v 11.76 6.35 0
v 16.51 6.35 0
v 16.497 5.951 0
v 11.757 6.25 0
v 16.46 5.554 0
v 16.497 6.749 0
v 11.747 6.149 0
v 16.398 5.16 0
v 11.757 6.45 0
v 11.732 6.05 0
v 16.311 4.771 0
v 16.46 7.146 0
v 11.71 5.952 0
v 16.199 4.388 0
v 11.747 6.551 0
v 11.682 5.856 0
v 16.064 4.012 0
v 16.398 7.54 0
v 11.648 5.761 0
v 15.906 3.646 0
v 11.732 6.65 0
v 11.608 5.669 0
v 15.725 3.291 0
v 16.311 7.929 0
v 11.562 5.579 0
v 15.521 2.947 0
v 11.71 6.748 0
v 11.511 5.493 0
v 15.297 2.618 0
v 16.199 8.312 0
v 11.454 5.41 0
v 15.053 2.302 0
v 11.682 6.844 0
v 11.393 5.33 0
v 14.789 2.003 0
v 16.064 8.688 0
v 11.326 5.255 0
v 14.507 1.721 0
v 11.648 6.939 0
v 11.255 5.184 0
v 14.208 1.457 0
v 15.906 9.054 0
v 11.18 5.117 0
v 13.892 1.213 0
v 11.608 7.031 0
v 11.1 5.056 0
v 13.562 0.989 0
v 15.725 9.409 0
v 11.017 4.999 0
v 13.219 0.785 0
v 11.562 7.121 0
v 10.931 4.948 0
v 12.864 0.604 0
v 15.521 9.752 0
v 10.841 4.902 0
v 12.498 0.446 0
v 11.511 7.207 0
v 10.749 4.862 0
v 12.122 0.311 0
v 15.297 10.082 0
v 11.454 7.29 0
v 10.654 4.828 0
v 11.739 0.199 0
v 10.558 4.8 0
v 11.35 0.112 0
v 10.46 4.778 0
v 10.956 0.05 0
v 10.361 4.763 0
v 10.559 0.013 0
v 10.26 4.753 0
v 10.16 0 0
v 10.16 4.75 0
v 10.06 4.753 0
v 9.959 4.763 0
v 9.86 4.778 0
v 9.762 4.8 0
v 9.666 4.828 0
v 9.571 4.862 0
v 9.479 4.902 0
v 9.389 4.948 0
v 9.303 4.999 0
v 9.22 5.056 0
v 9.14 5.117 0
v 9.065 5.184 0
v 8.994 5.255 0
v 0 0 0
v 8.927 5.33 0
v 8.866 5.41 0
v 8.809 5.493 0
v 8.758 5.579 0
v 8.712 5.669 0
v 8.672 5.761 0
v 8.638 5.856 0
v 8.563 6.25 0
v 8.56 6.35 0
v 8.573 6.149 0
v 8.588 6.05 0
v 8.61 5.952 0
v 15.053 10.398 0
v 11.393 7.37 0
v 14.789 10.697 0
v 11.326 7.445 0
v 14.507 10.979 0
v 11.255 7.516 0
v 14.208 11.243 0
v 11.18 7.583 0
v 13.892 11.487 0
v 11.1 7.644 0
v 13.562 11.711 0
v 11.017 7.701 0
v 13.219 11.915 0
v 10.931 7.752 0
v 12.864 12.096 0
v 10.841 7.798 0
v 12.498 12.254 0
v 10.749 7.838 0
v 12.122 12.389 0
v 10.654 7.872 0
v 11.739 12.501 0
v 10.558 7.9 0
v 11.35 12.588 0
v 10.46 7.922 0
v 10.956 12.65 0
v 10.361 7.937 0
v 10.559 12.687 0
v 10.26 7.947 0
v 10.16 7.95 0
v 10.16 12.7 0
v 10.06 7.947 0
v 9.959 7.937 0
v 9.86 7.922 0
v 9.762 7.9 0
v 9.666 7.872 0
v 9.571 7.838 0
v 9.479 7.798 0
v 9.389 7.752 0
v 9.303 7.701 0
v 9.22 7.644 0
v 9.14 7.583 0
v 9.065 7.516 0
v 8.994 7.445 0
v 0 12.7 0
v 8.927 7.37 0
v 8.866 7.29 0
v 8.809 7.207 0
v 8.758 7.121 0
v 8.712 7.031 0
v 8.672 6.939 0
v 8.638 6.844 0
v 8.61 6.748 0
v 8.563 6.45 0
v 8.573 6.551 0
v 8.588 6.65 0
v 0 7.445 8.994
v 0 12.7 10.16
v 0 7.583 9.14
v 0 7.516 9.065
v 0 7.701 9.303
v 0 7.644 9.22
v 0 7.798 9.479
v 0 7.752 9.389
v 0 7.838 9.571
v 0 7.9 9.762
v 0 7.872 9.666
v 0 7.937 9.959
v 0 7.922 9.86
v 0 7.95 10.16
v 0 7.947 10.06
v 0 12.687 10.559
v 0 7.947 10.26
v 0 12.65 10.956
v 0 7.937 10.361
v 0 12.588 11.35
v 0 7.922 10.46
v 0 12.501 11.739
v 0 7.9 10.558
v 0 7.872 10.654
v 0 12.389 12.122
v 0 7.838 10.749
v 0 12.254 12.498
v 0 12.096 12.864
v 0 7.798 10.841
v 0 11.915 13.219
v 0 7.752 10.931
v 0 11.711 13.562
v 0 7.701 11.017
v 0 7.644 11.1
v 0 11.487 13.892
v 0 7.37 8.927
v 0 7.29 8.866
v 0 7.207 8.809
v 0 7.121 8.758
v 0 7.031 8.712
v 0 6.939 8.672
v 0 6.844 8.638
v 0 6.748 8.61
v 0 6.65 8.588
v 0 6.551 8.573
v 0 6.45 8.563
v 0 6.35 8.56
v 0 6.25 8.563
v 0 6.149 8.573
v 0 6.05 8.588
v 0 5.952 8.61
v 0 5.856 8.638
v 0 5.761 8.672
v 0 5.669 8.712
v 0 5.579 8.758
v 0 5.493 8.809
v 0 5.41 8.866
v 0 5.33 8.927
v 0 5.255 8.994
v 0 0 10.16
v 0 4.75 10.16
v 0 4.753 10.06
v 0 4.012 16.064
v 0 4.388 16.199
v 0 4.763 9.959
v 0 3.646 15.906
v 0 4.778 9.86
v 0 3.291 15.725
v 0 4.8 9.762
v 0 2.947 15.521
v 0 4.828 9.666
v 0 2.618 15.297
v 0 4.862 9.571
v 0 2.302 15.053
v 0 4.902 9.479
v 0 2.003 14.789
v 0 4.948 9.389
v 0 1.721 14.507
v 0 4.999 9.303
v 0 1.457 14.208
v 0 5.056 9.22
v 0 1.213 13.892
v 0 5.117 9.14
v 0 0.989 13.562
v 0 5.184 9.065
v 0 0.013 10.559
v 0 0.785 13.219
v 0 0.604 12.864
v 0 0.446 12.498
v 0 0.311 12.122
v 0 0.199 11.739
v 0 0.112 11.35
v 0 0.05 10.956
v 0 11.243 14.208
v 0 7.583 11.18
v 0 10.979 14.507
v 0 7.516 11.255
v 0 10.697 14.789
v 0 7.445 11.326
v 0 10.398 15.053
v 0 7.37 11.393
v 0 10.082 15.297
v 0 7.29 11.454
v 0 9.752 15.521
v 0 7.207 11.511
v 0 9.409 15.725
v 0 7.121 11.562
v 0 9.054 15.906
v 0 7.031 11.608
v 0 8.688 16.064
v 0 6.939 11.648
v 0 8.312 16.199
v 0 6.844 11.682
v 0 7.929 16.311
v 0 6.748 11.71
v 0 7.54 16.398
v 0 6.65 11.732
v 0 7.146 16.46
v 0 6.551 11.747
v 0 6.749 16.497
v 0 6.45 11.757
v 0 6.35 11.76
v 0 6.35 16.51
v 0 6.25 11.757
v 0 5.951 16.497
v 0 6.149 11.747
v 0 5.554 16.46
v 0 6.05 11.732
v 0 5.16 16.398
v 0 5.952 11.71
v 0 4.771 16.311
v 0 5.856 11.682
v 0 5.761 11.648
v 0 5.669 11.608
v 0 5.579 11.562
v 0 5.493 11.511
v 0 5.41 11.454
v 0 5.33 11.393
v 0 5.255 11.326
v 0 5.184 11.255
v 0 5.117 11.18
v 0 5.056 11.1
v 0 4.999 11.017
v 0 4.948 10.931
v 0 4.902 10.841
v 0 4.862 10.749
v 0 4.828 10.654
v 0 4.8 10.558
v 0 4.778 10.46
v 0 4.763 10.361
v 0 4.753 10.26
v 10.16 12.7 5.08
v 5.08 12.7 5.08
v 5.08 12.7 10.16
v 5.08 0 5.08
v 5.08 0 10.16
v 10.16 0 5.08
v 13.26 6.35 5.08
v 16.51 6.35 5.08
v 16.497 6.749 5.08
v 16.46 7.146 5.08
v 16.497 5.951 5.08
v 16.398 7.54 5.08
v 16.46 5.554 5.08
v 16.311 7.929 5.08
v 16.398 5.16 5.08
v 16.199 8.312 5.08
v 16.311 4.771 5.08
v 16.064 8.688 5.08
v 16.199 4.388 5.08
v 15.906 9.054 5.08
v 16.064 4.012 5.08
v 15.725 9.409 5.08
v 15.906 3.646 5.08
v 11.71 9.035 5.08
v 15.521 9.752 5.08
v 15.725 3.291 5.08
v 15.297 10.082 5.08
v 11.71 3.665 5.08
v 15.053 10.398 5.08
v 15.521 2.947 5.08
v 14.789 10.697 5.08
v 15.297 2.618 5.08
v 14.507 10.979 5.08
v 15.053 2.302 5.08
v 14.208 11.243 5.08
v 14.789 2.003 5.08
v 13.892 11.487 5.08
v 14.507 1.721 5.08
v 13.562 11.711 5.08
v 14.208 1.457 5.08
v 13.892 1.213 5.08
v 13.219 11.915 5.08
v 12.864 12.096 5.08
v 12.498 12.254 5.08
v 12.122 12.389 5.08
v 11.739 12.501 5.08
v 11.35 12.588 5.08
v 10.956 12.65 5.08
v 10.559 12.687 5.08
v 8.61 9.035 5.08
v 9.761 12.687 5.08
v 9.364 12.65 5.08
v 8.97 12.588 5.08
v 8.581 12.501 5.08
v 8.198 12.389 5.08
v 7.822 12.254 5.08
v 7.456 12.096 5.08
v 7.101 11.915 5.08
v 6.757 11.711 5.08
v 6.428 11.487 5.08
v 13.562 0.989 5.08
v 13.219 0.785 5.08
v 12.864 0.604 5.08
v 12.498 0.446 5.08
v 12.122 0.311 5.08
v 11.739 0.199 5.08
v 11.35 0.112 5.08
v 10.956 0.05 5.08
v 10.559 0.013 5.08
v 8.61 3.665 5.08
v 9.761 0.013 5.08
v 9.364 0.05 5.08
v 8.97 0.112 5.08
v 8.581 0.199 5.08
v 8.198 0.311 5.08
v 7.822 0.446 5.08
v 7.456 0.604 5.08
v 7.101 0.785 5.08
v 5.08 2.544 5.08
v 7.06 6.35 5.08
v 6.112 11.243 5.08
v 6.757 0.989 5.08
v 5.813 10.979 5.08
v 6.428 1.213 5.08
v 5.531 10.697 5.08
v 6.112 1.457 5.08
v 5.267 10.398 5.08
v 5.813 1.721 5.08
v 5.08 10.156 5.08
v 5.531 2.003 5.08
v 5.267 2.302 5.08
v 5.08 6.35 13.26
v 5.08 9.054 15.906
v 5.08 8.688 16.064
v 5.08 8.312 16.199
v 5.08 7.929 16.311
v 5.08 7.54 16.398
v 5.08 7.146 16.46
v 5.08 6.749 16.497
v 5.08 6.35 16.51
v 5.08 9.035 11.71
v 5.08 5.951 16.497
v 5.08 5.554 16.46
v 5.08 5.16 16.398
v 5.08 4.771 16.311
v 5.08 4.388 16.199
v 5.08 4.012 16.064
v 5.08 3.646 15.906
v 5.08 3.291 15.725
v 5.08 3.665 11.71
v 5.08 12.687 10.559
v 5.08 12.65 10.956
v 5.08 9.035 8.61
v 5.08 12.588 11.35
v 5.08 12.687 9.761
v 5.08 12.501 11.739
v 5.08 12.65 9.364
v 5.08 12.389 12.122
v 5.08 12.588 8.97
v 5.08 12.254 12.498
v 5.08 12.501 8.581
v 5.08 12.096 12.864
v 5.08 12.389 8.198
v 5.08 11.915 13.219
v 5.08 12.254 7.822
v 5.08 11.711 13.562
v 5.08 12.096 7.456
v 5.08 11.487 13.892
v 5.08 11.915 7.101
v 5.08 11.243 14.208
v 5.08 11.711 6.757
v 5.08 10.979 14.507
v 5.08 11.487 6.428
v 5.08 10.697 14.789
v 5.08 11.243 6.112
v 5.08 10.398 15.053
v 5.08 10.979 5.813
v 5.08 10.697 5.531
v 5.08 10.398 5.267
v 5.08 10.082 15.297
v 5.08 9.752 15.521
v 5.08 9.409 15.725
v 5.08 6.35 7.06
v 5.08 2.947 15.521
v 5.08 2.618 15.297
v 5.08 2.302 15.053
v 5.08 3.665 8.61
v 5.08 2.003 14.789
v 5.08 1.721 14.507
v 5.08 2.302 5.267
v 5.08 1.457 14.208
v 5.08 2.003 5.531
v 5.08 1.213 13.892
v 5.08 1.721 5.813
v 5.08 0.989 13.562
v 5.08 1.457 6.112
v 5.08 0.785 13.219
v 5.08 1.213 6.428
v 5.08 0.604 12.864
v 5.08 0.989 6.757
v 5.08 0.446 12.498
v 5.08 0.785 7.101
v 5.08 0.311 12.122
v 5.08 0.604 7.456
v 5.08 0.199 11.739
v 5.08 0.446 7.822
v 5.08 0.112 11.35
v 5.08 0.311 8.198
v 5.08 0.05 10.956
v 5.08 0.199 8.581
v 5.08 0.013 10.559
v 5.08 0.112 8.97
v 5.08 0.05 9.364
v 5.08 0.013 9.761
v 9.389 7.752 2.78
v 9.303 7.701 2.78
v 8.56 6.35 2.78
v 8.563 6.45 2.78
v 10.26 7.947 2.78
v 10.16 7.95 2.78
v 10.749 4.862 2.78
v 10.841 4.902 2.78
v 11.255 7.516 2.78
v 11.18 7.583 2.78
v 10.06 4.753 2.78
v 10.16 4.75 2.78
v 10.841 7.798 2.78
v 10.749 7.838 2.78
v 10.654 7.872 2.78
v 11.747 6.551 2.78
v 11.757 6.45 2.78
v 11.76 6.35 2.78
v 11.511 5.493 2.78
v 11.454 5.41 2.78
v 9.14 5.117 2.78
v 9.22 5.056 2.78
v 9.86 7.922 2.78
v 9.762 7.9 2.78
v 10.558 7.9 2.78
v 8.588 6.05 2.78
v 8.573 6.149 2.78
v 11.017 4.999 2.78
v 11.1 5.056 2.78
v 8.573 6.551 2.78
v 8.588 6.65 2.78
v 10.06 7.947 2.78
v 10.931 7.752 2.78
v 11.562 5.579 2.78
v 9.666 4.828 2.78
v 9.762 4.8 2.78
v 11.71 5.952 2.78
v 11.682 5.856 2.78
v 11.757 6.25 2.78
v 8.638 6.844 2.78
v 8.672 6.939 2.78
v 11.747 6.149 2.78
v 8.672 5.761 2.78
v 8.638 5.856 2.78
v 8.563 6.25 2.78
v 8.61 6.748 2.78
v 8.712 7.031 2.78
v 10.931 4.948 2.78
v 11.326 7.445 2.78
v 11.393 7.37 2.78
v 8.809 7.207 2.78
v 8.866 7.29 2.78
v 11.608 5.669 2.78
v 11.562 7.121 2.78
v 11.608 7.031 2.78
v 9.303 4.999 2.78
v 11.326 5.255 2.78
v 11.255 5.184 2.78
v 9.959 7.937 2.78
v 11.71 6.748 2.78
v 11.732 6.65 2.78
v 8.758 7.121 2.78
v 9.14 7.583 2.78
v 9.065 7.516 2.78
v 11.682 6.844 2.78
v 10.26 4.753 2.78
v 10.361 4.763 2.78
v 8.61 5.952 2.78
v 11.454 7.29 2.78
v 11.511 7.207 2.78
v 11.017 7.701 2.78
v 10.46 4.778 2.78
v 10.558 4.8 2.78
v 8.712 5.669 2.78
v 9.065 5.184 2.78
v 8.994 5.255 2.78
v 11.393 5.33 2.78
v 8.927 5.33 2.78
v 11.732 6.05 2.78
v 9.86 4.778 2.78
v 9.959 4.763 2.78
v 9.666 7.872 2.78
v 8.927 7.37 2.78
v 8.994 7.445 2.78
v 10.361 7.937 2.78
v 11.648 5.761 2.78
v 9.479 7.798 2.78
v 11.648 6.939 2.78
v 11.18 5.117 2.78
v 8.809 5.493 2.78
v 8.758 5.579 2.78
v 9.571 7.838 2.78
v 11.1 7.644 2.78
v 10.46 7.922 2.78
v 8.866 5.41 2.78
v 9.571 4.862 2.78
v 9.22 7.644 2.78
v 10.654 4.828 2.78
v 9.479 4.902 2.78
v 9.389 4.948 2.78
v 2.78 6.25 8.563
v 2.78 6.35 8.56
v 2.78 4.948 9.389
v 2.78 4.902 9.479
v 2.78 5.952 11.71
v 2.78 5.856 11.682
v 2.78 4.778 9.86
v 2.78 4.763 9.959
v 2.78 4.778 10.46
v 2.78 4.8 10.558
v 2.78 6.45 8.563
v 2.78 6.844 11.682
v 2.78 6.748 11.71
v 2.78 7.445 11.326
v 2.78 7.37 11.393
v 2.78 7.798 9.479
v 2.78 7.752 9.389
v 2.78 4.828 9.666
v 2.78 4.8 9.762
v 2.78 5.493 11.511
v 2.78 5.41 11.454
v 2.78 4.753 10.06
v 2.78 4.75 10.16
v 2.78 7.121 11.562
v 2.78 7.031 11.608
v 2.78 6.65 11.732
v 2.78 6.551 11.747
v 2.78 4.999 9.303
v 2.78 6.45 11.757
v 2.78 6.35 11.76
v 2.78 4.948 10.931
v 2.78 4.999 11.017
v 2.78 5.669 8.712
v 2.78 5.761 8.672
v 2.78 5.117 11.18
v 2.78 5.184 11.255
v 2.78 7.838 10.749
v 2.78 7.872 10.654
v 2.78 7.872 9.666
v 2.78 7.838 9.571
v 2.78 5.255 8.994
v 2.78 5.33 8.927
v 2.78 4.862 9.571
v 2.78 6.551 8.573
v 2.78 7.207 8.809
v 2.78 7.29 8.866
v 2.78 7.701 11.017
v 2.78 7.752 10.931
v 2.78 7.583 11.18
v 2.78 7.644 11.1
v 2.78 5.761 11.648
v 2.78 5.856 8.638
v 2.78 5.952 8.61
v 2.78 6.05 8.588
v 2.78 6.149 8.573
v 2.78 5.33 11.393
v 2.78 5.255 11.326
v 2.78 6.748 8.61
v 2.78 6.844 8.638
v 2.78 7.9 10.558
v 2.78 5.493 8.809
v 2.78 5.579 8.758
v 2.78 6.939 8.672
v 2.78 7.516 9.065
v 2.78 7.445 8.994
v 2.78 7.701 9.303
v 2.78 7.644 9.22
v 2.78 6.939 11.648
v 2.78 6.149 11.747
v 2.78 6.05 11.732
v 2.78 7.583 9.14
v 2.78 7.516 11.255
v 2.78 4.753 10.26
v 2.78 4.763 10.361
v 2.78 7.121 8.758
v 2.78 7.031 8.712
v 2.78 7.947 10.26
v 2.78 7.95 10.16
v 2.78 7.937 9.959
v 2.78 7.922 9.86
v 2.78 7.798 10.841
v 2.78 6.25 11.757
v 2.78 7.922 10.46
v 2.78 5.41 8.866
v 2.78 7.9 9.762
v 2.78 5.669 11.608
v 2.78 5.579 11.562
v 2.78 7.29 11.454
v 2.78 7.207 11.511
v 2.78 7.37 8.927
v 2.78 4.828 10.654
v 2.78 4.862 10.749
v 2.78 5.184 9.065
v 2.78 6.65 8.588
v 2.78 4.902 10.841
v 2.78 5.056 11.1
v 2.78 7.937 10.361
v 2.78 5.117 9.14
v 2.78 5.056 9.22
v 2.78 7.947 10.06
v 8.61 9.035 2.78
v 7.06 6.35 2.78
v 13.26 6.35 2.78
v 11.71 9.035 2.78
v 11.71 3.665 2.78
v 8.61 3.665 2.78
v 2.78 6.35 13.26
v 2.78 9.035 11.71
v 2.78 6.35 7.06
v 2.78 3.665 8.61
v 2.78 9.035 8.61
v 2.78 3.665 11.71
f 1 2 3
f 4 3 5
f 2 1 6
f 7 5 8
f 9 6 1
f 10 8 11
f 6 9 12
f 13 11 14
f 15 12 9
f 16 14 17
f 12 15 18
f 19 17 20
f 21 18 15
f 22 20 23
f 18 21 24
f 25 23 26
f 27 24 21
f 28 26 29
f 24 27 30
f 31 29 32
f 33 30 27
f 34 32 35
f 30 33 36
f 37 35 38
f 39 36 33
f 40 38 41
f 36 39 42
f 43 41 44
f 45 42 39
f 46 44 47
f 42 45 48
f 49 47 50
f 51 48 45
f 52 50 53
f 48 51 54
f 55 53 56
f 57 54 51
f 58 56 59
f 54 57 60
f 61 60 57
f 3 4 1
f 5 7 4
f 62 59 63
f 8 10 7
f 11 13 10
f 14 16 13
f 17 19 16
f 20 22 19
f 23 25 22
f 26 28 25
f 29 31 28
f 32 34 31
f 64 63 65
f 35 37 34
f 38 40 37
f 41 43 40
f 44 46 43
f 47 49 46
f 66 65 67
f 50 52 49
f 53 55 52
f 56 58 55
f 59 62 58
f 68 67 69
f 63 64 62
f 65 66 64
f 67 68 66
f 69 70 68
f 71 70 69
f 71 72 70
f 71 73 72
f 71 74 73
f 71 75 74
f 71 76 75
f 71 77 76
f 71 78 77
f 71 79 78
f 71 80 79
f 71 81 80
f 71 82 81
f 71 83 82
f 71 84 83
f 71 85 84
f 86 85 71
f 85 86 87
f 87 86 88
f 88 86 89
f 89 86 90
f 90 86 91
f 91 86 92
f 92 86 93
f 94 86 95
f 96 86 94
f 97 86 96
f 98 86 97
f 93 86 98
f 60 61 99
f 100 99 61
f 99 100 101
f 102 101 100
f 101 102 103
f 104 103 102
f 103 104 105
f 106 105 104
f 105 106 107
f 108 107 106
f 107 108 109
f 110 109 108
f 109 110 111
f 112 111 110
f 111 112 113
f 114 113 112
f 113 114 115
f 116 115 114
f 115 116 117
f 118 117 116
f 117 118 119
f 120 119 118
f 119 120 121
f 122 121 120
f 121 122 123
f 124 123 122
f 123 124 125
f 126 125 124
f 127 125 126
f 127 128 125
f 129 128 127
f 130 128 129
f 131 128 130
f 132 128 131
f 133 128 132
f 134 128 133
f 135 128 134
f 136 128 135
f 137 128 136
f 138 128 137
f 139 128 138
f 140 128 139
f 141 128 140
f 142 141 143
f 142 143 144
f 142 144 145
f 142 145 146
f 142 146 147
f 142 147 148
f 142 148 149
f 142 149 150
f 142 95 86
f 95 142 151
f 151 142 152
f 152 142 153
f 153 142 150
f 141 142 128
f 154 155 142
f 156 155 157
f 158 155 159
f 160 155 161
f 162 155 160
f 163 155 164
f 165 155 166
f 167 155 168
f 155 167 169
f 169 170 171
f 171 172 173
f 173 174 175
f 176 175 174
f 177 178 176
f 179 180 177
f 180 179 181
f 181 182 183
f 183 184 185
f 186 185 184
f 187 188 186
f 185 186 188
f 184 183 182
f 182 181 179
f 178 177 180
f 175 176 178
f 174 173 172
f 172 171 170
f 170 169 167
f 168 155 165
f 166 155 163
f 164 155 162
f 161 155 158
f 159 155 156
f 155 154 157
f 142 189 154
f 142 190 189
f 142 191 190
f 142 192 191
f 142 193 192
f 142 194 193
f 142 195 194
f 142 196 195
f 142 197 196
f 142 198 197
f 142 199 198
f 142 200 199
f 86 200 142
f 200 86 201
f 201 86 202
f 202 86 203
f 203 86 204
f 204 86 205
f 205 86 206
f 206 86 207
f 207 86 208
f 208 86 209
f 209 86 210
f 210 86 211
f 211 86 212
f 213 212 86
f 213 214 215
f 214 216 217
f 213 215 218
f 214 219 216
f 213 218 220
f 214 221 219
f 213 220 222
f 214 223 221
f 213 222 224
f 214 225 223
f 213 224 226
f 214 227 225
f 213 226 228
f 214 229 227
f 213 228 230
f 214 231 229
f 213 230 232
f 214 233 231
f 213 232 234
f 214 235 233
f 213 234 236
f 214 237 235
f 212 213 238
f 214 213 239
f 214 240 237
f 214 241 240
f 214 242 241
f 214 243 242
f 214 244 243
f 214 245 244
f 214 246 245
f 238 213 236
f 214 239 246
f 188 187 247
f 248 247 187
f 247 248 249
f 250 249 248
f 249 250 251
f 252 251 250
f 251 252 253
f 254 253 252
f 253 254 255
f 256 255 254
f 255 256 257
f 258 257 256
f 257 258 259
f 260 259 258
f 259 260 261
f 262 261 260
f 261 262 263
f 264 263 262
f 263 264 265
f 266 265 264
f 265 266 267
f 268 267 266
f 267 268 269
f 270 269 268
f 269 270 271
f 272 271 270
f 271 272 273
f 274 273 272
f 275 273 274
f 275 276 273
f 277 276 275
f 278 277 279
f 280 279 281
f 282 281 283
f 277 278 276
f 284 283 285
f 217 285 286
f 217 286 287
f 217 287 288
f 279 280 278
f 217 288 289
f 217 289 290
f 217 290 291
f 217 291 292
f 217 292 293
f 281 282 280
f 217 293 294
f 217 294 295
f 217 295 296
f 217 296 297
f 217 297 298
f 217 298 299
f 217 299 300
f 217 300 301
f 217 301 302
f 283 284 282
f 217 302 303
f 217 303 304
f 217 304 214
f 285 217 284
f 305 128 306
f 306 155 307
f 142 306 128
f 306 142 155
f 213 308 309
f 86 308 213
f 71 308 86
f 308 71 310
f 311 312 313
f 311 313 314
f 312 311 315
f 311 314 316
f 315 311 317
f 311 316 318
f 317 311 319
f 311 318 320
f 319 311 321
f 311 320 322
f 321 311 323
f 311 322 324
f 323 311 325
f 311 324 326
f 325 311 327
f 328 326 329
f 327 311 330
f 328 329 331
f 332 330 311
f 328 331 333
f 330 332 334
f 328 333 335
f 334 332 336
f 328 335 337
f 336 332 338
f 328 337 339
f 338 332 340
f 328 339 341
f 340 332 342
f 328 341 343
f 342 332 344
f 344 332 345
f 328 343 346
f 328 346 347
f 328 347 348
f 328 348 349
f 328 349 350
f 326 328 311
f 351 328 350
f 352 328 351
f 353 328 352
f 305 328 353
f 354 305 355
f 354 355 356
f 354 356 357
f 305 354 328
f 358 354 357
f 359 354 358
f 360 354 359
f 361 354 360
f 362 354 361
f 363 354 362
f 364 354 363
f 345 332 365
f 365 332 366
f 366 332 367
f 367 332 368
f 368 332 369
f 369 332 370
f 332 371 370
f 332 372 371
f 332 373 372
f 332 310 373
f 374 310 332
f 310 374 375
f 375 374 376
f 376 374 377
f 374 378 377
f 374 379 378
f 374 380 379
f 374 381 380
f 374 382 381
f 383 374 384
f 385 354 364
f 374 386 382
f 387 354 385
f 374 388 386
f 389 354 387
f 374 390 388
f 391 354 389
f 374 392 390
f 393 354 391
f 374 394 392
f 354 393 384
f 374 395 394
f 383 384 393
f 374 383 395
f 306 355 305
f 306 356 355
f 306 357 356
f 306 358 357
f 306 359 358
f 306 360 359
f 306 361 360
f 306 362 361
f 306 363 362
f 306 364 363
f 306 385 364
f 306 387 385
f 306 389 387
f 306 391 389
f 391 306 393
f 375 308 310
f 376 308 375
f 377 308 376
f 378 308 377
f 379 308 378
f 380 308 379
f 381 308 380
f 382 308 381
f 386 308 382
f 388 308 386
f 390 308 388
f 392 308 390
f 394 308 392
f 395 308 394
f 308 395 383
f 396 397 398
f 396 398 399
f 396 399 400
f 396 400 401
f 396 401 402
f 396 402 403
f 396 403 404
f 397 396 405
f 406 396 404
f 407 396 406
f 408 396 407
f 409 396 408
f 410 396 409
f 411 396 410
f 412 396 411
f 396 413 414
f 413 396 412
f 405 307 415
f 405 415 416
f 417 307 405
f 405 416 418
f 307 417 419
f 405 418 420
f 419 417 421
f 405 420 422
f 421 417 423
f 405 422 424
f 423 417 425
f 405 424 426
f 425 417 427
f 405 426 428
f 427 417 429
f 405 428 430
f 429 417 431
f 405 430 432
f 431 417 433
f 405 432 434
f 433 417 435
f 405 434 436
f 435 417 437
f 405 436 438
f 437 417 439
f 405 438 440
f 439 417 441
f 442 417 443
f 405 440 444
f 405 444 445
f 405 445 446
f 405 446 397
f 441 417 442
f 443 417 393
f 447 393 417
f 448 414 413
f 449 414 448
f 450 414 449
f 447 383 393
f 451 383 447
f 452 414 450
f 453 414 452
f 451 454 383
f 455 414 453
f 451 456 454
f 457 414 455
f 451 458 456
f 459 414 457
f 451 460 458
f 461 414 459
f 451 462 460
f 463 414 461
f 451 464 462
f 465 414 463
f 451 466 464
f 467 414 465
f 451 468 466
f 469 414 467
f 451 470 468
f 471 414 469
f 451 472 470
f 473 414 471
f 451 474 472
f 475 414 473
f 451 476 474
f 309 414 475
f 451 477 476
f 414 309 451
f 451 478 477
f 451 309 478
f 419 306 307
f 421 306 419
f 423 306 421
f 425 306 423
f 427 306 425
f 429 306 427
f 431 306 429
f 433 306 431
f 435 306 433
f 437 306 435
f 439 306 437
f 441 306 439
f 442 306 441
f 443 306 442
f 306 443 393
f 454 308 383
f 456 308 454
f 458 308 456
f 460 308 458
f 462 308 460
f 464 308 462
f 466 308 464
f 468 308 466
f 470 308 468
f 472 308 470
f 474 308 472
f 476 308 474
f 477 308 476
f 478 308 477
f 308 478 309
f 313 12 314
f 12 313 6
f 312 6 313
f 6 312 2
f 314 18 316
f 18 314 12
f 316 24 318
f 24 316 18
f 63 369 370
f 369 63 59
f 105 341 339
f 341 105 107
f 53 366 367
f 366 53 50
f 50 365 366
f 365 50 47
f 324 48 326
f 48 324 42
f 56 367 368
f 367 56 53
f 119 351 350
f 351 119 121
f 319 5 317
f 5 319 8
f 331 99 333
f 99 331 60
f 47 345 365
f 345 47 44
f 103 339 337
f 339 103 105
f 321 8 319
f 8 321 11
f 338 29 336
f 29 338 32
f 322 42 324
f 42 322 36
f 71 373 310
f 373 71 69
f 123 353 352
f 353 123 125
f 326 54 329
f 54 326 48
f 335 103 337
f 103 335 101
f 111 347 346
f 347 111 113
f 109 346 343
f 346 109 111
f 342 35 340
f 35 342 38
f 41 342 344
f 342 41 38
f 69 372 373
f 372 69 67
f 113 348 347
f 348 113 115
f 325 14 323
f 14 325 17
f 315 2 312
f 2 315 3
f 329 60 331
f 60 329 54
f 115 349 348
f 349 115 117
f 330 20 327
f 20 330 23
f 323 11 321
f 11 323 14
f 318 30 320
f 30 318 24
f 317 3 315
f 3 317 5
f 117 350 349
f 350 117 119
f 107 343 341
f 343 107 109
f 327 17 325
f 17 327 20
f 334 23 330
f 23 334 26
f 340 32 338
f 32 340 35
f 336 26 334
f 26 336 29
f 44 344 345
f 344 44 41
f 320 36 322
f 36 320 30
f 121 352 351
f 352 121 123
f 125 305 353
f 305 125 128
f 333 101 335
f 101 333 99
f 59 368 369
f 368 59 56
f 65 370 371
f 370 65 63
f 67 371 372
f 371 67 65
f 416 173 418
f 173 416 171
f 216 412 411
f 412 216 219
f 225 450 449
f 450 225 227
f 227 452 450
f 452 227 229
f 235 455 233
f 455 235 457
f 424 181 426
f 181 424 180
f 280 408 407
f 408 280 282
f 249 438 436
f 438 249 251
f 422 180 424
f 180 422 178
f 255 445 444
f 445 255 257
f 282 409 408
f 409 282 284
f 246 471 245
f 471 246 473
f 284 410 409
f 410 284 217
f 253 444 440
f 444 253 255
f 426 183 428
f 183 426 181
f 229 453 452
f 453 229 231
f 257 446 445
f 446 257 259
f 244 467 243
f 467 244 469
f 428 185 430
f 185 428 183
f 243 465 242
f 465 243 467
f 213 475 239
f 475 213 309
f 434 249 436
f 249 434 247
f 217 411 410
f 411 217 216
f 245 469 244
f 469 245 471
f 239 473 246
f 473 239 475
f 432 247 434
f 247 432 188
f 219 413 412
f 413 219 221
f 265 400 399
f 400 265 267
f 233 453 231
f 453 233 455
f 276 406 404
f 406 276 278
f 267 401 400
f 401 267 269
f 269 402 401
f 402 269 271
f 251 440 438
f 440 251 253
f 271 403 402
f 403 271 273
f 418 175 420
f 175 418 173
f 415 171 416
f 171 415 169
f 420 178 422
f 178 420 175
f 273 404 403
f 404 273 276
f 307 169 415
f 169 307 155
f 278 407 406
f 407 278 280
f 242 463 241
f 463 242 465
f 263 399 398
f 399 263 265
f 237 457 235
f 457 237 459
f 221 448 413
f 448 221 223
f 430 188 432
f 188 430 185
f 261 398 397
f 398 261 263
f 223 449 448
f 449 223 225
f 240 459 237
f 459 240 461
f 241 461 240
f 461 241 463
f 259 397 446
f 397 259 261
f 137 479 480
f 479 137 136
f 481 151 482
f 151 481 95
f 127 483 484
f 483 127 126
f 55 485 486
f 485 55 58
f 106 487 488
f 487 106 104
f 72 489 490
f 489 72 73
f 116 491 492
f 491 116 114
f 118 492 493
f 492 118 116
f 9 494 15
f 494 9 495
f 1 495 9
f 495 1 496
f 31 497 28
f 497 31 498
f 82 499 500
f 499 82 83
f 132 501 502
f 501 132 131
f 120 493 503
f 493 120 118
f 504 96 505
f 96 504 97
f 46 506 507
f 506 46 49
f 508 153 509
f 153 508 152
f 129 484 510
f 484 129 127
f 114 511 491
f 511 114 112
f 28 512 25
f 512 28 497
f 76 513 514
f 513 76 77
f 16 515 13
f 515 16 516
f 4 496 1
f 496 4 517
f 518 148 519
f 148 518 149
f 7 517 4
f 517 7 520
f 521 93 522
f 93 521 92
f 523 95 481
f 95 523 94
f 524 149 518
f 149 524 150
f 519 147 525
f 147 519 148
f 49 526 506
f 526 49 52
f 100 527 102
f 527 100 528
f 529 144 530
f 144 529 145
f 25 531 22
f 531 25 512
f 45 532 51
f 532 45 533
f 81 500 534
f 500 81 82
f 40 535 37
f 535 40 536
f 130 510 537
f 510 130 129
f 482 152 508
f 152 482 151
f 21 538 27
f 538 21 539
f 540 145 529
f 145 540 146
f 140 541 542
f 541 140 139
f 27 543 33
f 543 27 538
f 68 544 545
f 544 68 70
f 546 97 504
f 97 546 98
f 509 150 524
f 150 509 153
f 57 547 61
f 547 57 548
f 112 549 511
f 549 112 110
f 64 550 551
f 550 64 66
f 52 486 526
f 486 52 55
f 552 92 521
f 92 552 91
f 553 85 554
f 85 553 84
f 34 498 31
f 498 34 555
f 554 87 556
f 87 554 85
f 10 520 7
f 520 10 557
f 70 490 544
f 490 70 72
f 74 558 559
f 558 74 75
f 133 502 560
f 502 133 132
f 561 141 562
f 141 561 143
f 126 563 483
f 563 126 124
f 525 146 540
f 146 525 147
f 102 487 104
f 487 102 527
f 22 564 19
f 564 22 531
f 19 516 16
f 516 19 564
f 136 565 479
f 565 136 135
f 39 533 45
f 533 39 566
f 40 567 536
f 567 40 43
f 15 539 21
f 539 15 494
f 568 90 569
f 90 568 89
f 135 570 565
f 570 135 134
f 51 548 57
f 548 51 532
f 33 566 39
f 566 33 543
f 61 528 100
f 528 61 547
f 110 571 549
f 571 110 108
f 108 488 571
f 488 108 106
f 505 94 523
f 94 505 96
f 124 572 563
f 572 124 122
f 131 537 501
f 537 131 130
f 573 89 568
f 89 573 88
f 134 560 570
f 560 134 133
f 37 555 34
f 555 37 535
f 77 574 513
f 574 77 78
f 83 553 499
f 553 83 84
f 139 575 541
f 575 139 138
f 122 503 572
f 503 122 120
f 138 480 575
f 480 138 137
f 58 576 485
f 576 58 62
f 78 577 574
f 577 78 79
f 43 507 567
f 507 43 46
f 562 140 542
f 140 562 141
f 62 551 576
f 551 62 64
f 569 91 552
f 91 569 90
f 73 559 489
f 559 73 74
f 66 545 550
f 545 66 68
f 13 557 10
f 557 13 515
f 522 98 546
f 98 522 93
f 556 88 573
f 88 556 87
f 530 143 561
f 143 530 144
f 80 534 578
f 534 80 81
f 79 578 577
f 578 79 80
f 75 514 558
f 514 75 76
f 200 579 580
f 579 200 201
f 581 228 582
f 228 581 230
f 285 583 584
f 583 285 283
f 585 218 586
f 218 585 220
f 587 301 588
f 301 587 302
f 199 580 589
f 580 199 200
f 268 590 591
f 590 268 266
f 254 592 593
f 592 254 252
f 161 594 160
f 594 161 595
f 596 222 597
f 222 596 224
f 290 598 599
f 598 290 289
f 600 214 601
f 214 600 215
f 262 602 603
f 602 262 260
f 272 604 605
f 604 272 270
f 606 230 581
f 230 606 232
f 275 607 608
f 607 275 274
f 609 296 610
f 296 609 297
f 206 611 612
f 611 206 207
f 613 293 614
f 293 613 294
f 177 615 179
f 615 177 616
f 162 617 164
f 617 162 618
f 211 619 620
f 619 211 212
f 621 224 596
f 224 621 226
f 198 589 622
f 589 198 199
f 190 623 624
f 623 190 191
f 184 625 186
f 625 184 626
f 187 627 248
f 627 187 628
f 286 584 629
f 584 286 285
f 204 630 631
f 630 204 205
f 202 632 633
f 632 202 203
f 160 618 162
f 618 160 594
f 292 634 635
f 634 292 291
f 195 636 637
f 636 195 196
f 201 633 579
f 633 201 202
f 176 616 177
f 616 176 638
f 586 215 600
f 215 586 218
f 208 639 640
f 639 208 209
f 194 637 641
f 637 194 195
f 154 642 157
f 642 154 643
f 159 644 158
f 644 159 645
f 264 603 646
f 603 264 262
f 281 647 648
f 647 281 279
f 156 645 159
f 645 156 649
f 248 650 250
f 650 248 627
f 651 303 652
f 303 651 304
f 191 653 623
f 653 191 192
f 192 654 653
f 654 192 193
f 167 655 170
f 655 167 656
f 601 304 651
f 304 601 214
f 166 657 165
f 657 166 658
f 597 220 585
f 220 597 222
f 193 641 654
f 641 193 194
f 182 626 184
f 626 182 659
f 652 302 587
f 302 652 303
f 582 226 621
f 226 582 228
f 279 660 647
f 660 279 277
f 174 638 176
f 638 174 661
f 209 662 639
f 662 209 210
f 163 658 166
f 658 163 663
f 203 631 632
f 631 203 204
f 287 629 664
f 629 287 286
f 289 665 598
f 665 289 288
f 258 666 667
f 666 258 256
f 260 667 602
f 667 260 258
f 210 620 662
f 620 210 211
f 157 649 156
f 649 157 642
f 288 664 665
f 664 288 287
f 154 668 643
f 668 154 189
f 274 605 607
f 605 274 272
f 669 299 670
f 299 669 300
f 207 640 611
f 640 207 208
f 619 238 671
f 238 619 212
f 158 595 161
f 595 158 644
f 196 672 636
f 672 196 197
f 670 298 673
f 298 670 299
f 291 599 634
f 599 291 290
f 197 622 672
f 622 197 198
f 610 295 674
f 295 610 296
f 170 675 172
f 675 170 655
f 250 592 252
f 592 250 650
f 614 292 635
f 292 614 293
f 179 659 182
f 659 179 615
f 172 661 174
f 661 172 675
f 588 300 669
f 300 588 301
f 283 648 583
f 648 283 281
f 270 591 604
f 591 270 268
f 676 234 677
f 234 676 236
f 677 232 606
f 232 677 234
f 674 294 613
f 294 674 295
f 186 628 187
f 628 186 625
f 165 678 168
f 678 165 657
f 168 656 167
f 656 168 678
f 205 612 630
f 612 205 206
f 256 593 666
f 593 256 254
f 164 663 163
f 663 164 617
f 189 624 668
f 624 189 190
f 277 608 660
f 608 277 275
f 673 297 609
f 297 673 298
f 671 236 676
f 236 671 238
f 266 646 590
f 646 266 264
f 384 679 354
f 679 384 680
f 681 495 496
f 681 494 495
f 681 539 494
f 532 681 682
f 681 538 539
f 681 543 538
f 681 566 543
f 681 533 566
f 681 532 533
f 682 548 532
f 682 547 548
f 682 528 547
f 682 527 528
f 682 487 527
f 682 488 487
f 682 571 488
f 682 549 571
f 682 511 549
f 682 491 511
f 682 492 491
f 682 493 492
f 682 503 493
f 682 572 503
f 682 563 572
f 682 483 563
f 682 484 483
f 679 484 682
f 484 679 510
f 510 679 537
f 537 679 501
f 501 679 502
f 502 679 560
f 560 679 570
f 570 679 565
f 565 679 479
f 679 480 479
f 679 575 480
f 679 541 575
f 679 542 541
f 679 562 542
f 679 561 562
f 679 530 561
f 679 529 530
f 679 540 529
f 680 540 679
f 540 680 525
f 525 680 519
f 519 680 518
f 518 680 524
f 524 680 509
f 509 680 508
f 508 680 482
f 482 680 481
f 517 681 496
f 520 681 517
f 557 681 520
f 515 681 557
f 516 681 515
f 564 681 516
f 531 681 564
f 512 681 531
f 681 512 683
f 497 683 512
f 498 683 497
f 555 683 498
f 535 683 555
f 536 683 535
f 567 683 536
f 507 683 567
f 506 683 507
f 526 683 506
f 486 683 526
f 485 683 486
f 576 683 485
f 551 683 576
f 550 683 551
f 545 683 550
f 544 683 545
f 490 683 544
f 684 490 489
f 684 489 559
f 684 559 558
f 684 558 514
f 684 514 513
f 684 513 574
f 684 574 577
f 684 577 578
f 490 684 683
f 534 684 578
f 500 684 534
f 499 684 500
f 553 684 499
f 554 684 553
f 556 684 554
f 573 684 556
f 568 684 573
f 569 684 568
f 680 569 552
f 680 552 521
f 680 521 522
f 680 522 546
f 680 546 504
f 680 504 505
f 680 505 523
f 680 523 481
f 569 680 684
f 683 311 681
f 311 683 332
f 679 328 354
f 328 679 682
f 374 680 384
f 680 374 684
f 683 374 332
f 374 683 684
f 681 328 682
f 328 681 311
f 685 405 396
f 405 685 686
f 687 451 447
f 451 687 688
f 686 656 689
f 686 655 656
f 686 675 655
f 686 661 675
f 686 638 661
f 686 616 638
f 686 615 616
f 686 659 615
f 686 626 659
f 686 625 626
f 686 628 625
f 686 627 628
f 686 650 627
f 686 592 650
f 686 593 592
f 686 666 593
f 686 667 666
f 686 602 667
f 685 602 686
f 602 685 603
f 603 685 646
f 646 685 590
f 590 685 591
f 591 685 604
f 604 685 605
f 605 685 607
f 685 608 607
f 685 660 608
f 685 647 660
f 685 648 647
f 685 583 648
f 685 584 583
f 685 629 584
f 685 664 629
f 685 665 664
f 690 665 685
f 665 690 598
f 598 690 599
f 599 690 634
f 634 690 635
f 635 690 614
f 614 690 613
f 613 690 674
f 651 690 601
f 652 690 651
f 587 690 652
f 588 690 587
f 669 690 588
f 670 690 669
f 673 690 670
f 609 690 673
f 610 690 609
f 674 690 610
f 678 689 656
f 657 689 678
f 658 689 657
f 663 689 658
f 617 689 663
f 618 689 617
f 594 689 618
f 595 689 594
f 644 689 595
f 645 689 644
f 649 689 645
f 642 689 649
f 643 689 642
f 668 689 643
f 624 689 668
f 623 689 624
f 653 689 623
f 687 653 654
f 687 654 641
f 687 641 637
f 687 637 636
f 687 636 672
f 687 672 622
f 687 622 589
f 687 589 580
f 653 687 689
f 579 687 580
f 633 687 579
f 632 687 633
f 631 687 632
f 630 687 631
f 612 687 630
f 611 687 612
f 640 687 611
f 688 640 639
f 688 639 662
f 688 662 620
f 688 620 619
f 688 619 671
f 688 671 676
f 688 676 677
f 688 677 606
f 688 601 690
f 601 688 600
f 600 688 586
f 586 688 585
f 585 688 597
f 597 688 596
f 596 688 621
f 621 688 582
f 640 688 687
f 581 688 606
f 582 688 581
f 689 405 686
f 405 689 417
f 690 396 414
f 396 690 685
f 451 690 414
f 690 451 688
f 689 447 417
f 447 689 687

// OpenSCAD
$fn=100;

mm = 1;
inch = 25.4 * mm;

LENGTH = .75 * inch;
EDGE_WIDTH = .5 * inch;
THICKNESS = .2 * inch;

MATERIAL_THICKNESS = 3 * mm;
OFFSET = .4 * inch;

HEX_R = 6.2 * mm / 2;
HEX_r = 5.6 * mm / 2;
HEX_THICKNESS = 2.3 * mm; 

PCB_L = 5 * inch;
PCB_W = 5 * inch;
PCB_H = 2 * mm;

//HEX_THICKNESS = 1.5 * mm; // for thin version
//THICKNESS = 3 * mm; // for thin version

SCREW_R = 1.6 * mm;
module hex(){
  linear_extrude(height=HEX_THICKNESS * 2, center=false) circle(r=HEX_R, $fn=6);
}
module hex_old(){
  difference(){
    cylinder(r=HEX_R, h=HEX_THICKNESS);
    for(i=[0, 1, 2, 3, 4, 5]){
      rotate(a=60 * i, v=[0, 0, 1])
	translate([HEX_r, -5, 5])rotate(a=90, v=[0, 1, 0])cube([10, 10, HEX_THICKNESS]);
    }
  }
}

TAB_HEIGHT = .5*mm;
TAB_R = 5*mm;
// tab to prevent rollup
module tab(x, y){
  translate([x, y])cylinder(r=TAB_R, h=TAB_HEIGHT);
}

module edge(length, thickness, offset){
  LENGTH = length;
  THICKNESS = thickness;
  OFFSET = offset;
  difference(){
    union(){
      difference(){
	cube([OFFSET, EDGE_WIDTH, OFFSET]);
	translate([THICKNESS, -.01 * EDGE_WIDTH/2, THICKNESS])scale([1, 1.01, 1])cube([LENGTH, EDGE_WIDTH, LENGTH]);
      }
      union(){
	translate([OFFSET, EDGE_WIDTH/2, 0])cylinder(r=EDGE_WIDTH / 2, h=THICKNESS);
	translate([0, EDGE_WIDTH/2, OFFSET])rotate(v=[0, 1, 0], a=90)cylinder(r=EDGE_WIDTH / 2, h=THICKNESS);
		//square top
		//translate([0, 0, OFFSET*1.5])rotate(v=[0, 1, 0], a=90)cube([EDGE_WIDTH,EDGE_WIDTH,THICKNESS]);
      }
    }
    translate([OFFSET, EDGE_WIDTH/2, 0])cylinder(r=SCREW_R, h=THICKNESS * 1.1);
    translate([-.01, EDGE_WIDTH/2, OFFSET])rotate(v=[0, 1, 0], a=90)cylinder(r=SCREW_R, h=THICKNESS * 10);
  }
}

module pcb(){
  cube([PCB_L, PCB_W, PCB_H]);
}

module inside_edge(length, thickness, offset){
  LENGTH = length;
  THICKNESS = thickness;
  OFFSET = offset;
  difference(){
    edge(length, thickness, offset);
    //translate([.2 * inch - 1*mm, EDGE_WIDTH/2 + PCB_H/2, .2 * inch - 1*mm])rotate(v=[-1, 0, 0], a=-90)translate([THICKNESS * 3/4, -1, THICKNESS])pcb();
    translate([OFFSET, EDGE_WIDTH/2, THICKNESS - HEX_THICKNESS])scale([1, 1, 1.01])hex();
    translate([THICKNESS - HEX_THICKNESS, EDGE_WIDTH/2, OFFSET])rotate(v=[0, 1, 0], a=90)scale([1, 1, 1.01])hex();
  }
}
module outside_edge(length, thickness, offset){
  difference(){
    edge(length, thickness, offset);
    translate([OFFSET, EDGE_WIDTH/2, 0])scale([1, 1, 1.01])cylinder(r=HEX_R * 1.1, h=HEX_THICKNESS);
    translate([0, EDGE_WIDTH/2, OFFSET])scale([1, 1, 1.01])rotate(v=[0, 1, 0], a=90)cylinder(r=HEX_R * 1.1, h=HEX_THICKNESS);
  }
}

module corner(length, thickness, offset){
  echo("offset", offset);
  LENGTH = length;
  THICKNESS = thickness;
  OFFSET = offset;
  union(){
    //tab(0, 0);
    //tab(LENGTH, 0);
    //tab(0, LENGTH);

    intersection(){
      difference(){
	cube(LENGTH);
	translate([THICKNESS, THICKNESS, THICKNESS])
	  cube(LENGTH);
	translate([OFFSET, OFFSET, 0])
	  translate([0, 0, -1])
	  cylinder(r=SCREW_R, h=2 * THICKNESS);
	translate([OFFSET, 0, OFFSET])
	  rotate(v=[-1, 0, 0], a=90) 
	  translate([0, 0, -1])
	  cylinder(r=SCREW_R, h=2 * THICKNESS);
	translate([0, OFFSET, OFFSET])
	  rotate(v=[0, 1, 0], a=90)
	  translate([0, 0, -1])
	  cylinder(r=SCREW_R, h=2 * THICKNESS);
      }
      
      union(){
	rotate(v=[0, 0, -1], a=0)cylinder(r=LENGTH*1.04, h=THICKNESS);
	rotate(v=[-1,0, 0], a=90)cylinder(r=LENGTH*1.04, h=THICKNESS);
	rotate(v=[0, 1, 0], a=90)cylinder(r=LENGTH*1.04 , h=THICKNESS);
      }
      // sphere(r=LENGTH);
    }
  }
}
module inside_corner(length, thickness, offset, standoff_h=10*mm){
  LENGTH = length;
  THICKNESS = thickness;
  OFFSET = offset;

  // translate([THICKNESS, THICKNESS, THICKNESS])cube(standoff_h*mm);
  difference(){
    corner(LENGTH, THICKNESS, OFFSET);
    translate([OFFSET, OFFSET, THICKNESS - HEX_THICKNESS])scale([1, 1, 100])hex();
    translate([OFFSET, THICKNESS - HEX_THICKNESS,  OFFSET])
      rotate(v=[-1, 0, 0], a=90)
      scale([1, 1, 100])
      hex();
    translate([THICKNESS - HEX_THICKNESS, OFFSET,  OFFSET])
      rotate(v=[1, 0, 0], a=30) // correct one!
      rotate(v=[0, 1, 0], a=90) // correct one!
      scale([1, 1, 100]) hex();
    //translate([THICKNESS * 2/4, THICKNESS * 2/4, THICKNESS + standoff_h])pcb();
  }
}
module outside_corner(length, thickness, offset, material_thickness){
  LENGTH = length + (material_thickness + thickness) * sqrt(2);
  THICKNESS = thickness;
  OFFSET = offset + material_thickness + thickness;
  echo("OFFSET", OFFSET);
  difference(){
    union(){
      corner(LENGTH, THICKNESS, OFFSET);
    }

    // counter bore
    translate([OFFSET,  HEX_THICKNESS, OFFSET])
      rotate(v=[1, 0, 0], a=90)
      rotate(v=[0, 0, 1], a=180)
      scale([1, 1, 100])
      cylinder(r=HEX_R * 1.1);
    translate([HEX_THICKNESS, OFFSET, OFFSET])
      rotate(v=[0, -1, 0], a=90)
      scale([1, 1, 100])
      cylinder(r=HEX_R * 1.1);
    translate([OFFSET,  OFFSET, HEX_THICKNESS, ])
      rotate(v=[0, 1, 0], a=180)
      scale([1, 1, 100])
      cylinder(r=HEX_R * 1.1);
  }
}
/* used for a specialized screen holder for photo booth */
module screen_clip(span, screen_h, overhang){
  difference(){
    union(){
      edge(LENGTH, THICKNESS, OFFSET);
      translate([OFFSET, 0, 0])cube([span, EDGE_WIDTH, THICKNESS]);
      translate([OFFSET + span - THICKNESS, 0, 0])cube([THICKNESS, EDGE_WIDTH, screen_h + THICKNESS]);
      translate([OFFSET + span - THICKNESS, 0, screen_h])cube([overhang + THICKNESS, EDGE_WIDTH, THICKNESS]);
    }
    union(){
      translate([OFFSET, EDGE_WIDTH/2, THICKNESS - HEX_THICKNESS])scale([1, 1, 1.01])hex();
      translate([THICKNESS - HEX_THICKNESS, EDGE_WIDTH/2, OFFSET])rotate(v=[0, 1, 0], a=90)scale([1, 1, 1.01])hex();
      translate([OFFSET, EDGE_WIDTH/2, 0])cylinder(r=SCREW_R, h=THICKNESS * 1.1);
    }
  }
}

// translate([0, MATERIAL_THICKNESS + THICKNESS, MATERIAL_THICKNESS + THICKNESS])inside_corner(LENGTH, THICKNESS, OFFSET); // corner
// translate([-MATERIAL_THICKNESS - THICKNESS, 0, 0])
// outside_corner(LENGTH, THICKNESS, OFFSET, MATERIAL_THICKNESS);

// translate([0, -1*inch, 0])inside_corner(LENGTH, THICKNESS, OFFSET);
// translate([0, 1*inch + 13, 0])rotate(v=[0, 0, 1], a=-90)inside_corner(LENGTH, THICKNESS, OFFSET);
inside_edge(LENGTH, THICKNESS, OFFSET);
